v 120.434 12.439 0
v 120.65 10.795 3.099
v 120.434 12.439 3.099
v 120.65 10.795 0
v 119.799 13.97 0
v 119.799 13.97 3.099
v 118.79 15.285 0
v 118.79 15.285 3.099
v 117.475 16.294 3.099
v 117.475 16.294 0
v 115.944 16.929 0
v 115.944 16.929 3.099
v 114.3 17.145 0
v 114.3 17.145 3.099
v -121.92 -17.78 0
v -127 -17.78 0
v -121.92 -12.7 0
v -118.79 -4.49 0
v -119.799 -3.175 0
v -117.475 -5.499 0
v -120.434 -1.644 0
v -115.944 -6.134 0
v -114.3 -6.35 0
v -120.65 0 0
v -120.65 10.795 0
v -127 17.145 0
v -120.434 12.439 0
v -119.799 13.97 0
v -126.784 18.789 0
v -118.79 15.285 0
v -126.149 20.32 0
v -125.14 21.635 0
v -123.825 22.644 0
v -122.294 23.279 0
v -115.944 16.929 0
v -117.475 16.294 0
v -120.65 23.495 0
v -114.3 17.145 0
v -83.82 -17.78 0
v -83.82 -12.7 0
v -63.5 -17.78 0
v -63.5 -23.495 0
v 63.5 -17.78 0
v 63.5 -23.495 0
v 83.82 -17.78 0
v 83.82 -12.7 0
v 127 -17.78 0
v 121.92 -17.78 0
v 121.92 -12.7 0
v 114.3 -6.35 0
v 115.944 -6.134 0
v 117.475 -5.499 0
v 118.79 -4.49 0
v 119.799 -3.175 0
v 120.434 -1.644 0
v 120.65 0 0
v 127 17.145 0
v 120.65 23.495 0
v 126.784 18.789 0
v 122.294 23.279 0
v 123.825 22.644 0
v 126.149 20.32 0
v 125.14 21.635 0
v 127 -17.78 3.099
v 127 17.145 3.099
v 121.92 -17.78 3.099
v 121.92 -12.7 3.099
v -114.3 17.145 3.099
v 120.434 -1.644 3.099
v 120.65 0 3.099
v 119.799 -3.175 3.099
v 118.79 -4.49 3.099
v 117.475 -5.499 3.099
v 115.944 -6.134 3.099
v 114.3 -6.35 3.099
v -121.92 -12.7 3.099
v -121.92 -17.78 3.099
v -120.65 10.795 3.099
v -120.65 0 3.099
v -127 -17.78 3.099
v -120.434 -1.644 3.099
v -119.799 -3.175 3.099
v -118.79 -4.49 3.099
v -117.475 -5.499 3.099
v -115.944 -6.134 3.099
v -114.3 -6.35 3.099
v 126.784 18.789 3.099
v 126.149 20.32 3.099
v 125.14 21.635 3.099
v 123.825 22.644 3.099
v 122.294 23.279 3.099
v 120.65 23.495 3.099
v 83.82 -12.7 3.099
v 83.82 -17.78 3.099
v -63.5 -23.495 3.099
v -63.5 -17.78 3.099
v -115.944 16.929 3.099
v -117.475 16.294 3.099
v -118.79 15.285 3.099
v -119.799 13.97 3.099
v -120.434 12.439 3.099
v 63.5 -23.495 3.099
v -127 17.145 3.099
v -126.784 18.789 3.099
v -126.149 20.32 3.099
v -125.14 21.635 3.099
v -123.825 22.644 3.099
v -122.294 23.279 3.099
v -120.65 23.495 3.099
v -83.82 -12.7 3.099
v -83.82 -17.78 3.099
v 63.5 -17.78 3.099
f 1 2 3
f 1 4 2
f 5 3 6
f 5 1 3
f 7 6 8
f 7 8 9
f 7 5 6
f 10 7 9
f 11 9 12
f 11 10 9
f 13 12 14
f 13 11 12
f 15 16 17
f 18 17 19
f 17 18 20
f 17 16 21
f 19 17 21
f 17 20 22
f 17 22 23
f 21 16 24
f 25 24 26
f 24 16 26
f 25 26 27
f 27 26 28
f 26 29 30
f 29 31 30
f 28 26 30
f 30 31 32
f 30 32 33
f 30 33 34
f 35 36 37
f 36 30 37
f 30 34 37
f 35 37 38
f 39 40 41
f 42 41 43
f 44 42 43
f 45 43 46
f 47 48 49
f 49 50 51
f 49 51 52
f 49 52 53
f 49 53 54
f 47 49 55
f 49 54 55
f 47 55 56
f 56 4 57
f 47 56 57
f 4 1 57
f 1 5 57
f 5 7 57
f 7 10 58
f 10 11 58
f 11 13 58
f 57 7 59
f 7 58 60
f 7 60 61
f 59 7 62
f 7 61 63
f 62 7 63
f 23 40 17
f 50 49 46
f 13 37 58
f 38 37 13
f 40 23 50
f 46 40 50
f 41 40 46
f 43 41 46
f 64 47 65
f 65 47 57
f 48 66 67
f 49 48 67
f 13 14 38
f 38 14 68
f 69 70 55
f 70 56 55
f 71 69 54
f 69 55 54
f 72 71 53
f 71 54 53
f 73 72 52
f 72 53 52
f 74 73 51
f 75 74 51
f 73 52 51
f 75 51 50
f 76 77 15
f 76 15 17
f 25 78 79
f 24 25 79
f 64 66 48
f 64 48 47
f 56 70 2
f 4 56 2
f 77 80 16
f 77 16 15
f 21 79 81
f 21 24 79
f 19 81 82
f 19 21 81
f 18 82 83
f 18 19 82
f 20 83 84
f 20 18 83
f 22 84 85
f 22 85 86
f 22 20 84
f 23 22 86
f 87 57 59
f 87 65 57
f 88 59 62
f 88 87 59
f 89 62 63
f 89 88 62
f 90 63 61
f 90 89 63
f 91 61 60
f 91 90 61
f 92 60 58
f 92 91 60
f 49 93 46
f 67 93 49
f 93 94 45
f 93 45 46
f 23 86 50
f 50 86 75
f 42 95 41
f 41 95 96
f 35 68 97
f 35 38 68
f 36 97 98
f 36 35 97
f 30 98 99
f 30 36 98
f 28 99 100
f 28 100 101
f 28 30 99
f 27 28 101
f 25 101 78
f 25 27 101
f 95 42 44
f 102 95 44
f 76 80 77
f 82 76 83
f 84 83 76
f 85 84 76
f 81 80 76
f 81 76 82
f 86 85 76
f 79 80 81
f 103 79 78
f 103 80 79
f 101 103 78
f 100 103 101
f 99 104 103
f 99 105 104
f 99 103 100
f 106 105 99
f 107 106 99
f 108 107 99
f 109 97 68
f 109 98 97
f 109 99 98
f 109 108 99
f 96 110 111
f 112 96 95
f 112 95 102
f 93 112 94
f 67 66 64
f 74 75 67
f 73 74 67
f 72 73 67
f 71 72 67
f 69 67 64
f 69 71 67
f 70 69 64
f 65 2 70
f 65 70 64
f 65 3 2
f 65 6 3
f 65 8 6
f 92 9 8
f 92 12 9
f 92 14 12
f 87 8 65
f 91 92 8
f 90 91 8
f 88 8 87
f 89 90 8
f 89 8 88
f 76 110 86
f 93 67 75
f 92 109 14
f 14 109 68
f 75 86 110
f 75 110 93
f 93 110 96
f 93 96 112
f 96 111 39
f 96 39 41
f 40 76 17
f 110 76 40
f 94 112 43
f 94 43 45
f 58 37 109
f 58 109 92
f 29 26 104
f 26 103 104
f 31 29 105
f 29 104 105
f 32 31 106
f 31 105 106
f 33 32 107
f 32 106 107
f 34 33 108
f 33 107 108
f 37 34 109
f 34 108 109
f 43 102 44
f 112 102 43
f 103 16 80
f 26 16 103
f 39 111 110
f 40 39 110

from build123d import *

# Parameters (mm, degrees)
SKETCH1_W           = 254
SKETCH1_H           = 46.99
BOSS_EXTRUDE1_DEPTH = 3.0988
FILLET1_R           = 6.35
SKETCH2_W           = 63.5
SKETCH2_H           = 5.715
CUT_EXTRUDE1_DEPTH  = 130.192173085
SKETCH3_W           = 38.1
SKETCH3_H           = 5.08
CUT_EXTRUDE2_DEPTH  = 130.192173085
CUT_EXTRUDE3_DEPTH  = 130.192173085
FILLET2_R           = 6.35


with BuildPart() as part:
    # Sketch1 → Boss-Extrude1 (new body)
    with BuildSketch(Plane.XY):
        Rectangle(SKETCH1_W, SKETCH1_H)
    extrude(amount=BOSS_EXTRUDE1_DEPTH)

    # Fillet1
    fillet1_edges = [part.edges().sort_by_distance(p)[0] for p in [
        (-127, 23.495, 1.5494),
        (127, 23.495, 1.5494),
    ]]
    fillet(fillet1_edges, radius=FILLET1_R)

    # Sketch2 → Cut-Extrude1 (cut, through all)
    with BuildSketch(Plane.XY.offset(3.0988)):
        with Locations((-95.25, -20.6375)):
            Rectangle(SKETCH2_W, SKETCH2_H)
        with Locations((95.25, -20.6375)):
            Rectangle(SKETCH2_W, SKETCH2_H)
    extrude(amount=-CUT_EXTRUDE1_DEPTH, mode=Mode.SUBTRACT)

    # Sketch3 → Cut-Extrude2 (cut, through all)
    with BuildSketch(Plane.XY.offset(3.0988)):
        with Locations((-102.87, -15.24)):
            Rectangle(SKETCH3_W, SKETCH3_H)
        with Locations((102.87, -15.24)):
            Rectangle(SKETCH3_W, SKETCH3_H)
    extrude(amount=-CUT_EXTRUDE2_DEPTH, mode=Mode.SUBTRACT)

    # Sketch4 → Cut-Extrude3 (cut, through all)
    with BuildSketch(Plane.XY.offset(3.0988)):
        Polygon((-77.47, -6.35), (77.47, -6.35), (120.65, -6.35), (120.65, 17.145), (-120.65, 17.145), (-120.65, -6.35), align=None)
    extrude(amount=-CUT_EXTRUDE3_DEPTH, mode=Mode.SUBTRACT)

    # Fillet2
    fillet2_edges = [part.edges().sort_by_distance(p)[0] for p in [
        (-120.65, 17.145, 1.5494),
        (120.65, 17.145, 1.5494),
        (120.65, -6.35, 1.5494),
        (-120.65, -6.35, 1.5494),
    ]]
    fillet(fillet2_edges, radius=FILLET2_R)


solid = part.part
